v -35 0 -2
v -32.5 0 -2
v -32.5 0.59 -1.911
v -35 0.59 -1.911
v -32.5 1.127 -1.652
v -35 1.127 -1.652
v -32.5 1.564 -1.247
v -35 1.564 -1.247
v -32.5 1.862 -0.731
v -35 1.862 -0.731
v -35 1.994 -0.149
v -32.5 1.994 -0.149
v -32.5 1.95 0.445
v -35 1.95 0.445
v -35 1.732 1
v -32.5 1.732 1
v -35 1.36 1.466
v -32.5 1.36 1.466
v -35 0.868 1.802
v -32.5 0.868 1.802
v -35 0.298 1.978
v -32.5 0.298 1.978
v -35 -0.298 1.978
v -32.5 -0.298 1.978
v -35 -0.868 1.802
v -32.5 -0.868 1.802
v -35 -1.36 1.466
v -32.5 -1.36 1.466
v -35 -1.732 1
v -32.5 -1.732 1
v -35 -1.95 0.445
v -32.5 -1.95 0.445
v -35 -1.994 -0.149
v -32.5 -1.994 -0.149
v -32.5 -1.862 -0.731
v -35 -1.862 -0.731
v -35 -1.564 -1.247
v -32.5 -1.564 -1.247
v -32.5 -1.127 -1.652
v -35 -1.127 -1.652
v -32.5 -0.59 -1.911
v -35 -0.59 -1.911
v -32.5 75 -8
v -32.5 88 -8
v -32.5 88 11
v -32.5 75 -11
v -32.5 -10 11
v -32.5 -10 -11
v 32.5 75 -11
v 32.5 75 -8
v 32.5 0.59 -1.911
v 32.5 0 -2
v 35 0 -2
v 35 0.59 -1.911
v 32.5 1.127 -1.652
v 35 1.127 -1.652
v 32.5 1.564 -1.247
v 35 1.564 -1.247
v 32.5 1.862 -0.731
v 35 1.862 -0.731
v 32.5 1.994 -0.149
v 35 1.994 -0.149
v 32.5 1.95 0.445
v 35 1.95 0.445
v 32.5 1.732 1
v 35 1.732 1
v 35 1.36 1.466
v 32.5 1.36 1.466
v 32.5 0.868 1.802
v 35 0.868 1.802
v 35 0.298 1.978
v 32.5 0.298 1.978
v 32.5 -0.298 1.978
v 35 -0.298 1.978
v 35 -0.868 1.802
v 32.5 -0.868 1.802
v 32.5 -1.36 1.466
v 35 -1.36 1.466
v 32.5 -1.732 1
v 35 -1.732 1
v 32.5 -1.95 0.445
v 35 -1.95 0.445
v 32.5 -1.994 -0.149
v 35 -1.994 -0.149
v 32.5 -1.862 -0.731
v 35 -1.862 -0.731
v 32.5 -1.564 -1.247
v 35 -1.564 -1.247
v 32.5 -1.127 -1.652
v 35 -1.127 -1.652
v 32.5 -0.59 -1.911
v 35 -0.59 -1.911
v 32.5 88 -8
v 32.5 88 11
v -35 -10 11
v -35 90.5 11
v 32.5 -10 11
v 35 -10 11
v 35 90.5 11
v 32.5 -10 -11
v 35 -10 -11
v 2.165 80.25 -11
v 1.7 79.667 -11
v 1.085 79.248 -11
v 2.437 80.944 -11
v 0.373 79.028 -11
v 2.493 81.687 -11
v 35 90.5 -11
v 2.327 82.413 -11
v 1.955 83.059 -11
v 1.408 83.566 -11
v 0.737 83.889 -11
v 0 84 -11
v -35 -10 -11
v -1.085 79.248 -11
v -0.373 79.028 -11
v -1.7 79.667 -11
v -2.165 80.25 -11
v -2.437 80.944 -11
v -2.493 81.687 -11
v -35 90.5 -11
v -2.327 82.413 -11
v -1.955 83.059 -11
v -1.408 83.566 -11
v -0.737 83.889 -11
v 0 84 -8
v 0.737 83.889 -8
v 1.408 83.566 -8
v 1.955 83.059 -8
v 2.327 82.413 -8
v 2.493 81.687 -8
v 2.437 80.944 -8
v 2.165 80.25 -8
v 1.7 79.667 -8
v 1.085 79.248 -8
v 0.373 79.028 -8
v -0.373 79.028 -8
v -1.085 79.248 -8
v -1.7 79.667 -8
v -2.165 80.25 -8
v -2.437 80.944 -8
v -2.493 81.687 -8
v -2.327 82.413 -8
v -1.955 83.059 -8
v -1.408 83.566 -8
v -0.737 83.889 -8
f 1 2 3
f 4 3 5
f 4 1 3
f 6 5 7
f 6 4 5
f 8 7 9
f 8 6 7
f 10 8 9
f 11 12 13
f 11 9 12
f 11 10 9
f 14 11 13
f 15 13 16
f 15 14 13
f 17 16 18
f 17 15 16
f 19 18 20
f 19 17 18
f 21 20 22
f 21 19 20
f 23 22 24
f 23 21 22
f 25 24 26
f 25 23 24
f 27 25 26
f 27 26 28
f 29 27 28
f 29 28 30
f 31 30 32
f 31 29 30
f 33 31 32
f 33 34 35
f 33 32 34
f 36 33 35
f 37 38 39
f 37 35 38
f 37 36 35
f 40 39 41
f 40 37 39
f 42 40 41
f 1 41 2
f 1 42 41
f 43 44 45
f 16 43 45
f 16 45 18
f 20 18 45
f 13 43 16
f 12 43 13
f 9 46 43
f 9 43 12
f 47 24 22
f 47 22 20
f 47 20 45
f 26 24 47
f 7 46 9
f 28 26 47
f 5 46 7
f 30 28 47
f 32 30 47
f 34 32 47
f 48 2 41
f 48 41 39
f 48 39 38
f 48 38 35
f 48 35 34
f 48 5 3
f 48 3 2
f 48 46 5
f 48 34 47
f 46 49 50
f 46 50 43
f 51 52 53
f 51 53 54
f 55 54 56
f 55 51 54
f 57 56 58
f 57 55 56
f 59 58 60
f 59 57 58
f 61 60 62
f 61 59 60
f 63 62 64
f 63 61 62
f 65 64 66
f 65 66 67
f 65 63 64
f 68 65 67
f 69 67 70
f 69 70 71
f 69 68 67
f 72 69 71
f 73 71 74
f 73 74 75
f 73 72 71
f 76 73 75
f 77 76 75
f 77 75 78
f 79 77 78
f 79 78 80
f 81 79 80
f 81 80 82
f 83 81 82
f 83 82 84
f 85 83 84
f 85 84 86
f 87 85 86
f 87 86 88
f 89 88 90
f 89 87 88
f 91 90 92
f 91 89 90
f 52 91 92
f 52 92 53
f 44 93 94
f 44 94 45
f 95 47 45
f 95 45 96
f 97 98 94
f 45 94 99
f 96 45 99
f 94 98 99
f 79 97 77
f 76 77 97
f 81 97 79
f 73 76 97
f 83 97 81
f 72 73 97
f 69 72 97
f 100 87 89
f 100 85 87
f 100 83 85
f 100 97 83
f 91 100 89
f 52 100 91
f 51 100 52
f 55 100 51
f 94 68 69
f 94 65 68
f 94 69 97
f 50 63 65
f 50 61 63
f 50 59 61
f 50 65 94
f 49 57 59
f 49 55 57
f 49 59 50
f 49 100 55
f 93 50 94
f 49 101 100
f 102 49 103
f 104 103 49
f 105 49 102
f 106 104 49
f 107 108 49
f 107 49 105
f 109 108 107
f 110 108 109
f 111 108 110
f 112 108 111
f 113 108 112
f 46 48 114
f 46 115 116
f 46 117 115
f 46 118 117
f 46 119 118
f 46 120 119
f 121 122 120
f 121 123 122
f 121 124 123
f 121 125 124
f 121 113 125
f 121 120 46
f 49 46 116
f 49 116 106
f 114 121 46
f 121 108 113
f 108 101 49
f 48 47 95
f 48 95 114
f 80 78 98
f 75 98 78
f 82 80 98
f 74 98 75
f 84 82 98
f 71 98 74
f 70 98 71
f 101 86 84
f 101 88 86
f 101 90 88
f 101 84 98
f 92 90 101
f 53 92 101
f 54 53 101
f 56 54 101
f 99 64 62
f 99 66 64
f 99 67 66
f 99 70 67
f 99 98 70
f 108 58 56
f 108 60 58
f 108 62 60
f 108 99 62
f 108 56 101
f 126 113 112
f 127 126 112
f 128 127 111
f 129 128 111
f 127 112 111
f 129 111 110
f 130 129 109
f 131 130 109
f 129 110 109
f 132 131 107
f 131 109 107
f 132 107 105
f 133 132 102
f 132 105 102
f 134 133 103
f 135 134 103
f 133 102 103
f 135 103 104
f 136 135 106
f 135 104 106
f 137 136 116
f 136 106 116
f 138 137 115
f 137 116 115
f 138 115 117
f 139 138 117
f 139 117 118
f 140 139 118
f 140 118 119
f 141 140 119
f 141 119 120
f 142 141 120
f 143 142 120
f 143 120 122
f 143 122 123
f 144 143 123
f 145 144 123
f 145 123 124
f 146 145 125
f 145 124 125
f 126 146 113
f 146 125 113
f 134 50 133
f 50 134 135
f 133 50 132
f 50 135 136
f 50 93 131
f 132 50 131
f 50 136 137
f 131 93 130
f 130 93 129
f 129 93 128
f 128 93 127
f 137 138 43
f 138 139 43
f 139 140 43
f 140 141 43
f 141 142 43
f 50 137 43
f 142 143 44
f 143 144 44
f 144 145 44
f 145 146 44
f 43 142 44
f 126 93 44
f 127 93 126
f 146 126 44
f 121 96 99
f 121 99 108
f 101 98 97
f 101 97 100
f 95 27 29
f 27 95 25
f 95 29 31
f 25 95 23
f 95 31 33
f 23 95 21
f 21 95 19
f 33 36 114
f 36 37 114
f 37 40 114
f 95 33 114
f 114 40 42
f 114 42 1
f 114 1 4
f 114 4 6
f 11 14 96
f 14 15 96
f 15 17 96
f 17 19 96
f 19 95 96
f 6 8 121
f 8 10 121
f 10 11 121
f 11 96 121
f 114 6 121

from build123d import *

# Parameters (mm, degrees)
CROQUIS1_W                 = 22
CROQUIS1_H                 = 100.5
CROQUIS1_R                 = 2
SALIENTE_EXTRUIR1_DEPTH    = 35
CORTAR_EXTRUIR2_DEPTH      = 100.494974747
CORTAR_EXTRUIR2_DEPTH_BACK = 100.494974747
CROQUIS3_W                 = 65
CROQUIS3_H                 = 13
CROQUIS3_R                 = 2.5
SALIENTE_EXTRUIR3_DEPTH    = 3


with BuildPart() as part:
    # Croquis1 → Saliente-Extruir1 (new, symmetric)
    with BuildSketch(Plane(origin=(0, 0, 0), x_dir=(0, 0, -1), z_dir=(1, 0, 0))):
        with Locations((0, 40.25)):
            Rectangle(CROQUIS1_W, CROQUIS1_H)
        Circle(CROQUIS1_R, mode=Mode.SUBTRACT)
    extrude(amount=SALIENTE_EXTRUIR1_DEPTH, both=True)

    # Croquis2 → Cortar-Extruir2 (cut, two sides: drawn at the far end of the back side and taken through both)
    with BuildSketch(Plane.XY.offset(11).offset(-CORTAR_EXTRUIR2_DEPTH_BACK)):
        Polygon((32.5, -262.128065288), (32.5, -10), (32.5, 88), (-32.5, 88), (-32.5, -10), (-32.5, -262.128065288), (-32.5, -766.384195863), (32.5, -766.384195863), align=None)
    extrude(amount=CORTAR_EXTRUIR2_DEPTH + CORTAR_EXTRUIR2_DEPTH_BACK, mode=Mode.SUBTRACT)

    # Croquis3 → Saliente-Extruir3 (add)
    with BuildSketch(Plane(origin=(0, 0, -11), x_dir=(-1, 0, 0), z_dir=(0, 0, -1))):
        with Locations((0, 81.5)):
            Rectangle(CROQUIS3_W, CROQUIS3_H)
        with Locations(Location((0, 81.5, 0), (0, 0, 90))):
            Circle(CROQUIS3_R, mode=Mode.SUBTRACT)
    extrude(amount=-SALIENTE_EXTRUIR3_DEPTH)


solid = part.part
